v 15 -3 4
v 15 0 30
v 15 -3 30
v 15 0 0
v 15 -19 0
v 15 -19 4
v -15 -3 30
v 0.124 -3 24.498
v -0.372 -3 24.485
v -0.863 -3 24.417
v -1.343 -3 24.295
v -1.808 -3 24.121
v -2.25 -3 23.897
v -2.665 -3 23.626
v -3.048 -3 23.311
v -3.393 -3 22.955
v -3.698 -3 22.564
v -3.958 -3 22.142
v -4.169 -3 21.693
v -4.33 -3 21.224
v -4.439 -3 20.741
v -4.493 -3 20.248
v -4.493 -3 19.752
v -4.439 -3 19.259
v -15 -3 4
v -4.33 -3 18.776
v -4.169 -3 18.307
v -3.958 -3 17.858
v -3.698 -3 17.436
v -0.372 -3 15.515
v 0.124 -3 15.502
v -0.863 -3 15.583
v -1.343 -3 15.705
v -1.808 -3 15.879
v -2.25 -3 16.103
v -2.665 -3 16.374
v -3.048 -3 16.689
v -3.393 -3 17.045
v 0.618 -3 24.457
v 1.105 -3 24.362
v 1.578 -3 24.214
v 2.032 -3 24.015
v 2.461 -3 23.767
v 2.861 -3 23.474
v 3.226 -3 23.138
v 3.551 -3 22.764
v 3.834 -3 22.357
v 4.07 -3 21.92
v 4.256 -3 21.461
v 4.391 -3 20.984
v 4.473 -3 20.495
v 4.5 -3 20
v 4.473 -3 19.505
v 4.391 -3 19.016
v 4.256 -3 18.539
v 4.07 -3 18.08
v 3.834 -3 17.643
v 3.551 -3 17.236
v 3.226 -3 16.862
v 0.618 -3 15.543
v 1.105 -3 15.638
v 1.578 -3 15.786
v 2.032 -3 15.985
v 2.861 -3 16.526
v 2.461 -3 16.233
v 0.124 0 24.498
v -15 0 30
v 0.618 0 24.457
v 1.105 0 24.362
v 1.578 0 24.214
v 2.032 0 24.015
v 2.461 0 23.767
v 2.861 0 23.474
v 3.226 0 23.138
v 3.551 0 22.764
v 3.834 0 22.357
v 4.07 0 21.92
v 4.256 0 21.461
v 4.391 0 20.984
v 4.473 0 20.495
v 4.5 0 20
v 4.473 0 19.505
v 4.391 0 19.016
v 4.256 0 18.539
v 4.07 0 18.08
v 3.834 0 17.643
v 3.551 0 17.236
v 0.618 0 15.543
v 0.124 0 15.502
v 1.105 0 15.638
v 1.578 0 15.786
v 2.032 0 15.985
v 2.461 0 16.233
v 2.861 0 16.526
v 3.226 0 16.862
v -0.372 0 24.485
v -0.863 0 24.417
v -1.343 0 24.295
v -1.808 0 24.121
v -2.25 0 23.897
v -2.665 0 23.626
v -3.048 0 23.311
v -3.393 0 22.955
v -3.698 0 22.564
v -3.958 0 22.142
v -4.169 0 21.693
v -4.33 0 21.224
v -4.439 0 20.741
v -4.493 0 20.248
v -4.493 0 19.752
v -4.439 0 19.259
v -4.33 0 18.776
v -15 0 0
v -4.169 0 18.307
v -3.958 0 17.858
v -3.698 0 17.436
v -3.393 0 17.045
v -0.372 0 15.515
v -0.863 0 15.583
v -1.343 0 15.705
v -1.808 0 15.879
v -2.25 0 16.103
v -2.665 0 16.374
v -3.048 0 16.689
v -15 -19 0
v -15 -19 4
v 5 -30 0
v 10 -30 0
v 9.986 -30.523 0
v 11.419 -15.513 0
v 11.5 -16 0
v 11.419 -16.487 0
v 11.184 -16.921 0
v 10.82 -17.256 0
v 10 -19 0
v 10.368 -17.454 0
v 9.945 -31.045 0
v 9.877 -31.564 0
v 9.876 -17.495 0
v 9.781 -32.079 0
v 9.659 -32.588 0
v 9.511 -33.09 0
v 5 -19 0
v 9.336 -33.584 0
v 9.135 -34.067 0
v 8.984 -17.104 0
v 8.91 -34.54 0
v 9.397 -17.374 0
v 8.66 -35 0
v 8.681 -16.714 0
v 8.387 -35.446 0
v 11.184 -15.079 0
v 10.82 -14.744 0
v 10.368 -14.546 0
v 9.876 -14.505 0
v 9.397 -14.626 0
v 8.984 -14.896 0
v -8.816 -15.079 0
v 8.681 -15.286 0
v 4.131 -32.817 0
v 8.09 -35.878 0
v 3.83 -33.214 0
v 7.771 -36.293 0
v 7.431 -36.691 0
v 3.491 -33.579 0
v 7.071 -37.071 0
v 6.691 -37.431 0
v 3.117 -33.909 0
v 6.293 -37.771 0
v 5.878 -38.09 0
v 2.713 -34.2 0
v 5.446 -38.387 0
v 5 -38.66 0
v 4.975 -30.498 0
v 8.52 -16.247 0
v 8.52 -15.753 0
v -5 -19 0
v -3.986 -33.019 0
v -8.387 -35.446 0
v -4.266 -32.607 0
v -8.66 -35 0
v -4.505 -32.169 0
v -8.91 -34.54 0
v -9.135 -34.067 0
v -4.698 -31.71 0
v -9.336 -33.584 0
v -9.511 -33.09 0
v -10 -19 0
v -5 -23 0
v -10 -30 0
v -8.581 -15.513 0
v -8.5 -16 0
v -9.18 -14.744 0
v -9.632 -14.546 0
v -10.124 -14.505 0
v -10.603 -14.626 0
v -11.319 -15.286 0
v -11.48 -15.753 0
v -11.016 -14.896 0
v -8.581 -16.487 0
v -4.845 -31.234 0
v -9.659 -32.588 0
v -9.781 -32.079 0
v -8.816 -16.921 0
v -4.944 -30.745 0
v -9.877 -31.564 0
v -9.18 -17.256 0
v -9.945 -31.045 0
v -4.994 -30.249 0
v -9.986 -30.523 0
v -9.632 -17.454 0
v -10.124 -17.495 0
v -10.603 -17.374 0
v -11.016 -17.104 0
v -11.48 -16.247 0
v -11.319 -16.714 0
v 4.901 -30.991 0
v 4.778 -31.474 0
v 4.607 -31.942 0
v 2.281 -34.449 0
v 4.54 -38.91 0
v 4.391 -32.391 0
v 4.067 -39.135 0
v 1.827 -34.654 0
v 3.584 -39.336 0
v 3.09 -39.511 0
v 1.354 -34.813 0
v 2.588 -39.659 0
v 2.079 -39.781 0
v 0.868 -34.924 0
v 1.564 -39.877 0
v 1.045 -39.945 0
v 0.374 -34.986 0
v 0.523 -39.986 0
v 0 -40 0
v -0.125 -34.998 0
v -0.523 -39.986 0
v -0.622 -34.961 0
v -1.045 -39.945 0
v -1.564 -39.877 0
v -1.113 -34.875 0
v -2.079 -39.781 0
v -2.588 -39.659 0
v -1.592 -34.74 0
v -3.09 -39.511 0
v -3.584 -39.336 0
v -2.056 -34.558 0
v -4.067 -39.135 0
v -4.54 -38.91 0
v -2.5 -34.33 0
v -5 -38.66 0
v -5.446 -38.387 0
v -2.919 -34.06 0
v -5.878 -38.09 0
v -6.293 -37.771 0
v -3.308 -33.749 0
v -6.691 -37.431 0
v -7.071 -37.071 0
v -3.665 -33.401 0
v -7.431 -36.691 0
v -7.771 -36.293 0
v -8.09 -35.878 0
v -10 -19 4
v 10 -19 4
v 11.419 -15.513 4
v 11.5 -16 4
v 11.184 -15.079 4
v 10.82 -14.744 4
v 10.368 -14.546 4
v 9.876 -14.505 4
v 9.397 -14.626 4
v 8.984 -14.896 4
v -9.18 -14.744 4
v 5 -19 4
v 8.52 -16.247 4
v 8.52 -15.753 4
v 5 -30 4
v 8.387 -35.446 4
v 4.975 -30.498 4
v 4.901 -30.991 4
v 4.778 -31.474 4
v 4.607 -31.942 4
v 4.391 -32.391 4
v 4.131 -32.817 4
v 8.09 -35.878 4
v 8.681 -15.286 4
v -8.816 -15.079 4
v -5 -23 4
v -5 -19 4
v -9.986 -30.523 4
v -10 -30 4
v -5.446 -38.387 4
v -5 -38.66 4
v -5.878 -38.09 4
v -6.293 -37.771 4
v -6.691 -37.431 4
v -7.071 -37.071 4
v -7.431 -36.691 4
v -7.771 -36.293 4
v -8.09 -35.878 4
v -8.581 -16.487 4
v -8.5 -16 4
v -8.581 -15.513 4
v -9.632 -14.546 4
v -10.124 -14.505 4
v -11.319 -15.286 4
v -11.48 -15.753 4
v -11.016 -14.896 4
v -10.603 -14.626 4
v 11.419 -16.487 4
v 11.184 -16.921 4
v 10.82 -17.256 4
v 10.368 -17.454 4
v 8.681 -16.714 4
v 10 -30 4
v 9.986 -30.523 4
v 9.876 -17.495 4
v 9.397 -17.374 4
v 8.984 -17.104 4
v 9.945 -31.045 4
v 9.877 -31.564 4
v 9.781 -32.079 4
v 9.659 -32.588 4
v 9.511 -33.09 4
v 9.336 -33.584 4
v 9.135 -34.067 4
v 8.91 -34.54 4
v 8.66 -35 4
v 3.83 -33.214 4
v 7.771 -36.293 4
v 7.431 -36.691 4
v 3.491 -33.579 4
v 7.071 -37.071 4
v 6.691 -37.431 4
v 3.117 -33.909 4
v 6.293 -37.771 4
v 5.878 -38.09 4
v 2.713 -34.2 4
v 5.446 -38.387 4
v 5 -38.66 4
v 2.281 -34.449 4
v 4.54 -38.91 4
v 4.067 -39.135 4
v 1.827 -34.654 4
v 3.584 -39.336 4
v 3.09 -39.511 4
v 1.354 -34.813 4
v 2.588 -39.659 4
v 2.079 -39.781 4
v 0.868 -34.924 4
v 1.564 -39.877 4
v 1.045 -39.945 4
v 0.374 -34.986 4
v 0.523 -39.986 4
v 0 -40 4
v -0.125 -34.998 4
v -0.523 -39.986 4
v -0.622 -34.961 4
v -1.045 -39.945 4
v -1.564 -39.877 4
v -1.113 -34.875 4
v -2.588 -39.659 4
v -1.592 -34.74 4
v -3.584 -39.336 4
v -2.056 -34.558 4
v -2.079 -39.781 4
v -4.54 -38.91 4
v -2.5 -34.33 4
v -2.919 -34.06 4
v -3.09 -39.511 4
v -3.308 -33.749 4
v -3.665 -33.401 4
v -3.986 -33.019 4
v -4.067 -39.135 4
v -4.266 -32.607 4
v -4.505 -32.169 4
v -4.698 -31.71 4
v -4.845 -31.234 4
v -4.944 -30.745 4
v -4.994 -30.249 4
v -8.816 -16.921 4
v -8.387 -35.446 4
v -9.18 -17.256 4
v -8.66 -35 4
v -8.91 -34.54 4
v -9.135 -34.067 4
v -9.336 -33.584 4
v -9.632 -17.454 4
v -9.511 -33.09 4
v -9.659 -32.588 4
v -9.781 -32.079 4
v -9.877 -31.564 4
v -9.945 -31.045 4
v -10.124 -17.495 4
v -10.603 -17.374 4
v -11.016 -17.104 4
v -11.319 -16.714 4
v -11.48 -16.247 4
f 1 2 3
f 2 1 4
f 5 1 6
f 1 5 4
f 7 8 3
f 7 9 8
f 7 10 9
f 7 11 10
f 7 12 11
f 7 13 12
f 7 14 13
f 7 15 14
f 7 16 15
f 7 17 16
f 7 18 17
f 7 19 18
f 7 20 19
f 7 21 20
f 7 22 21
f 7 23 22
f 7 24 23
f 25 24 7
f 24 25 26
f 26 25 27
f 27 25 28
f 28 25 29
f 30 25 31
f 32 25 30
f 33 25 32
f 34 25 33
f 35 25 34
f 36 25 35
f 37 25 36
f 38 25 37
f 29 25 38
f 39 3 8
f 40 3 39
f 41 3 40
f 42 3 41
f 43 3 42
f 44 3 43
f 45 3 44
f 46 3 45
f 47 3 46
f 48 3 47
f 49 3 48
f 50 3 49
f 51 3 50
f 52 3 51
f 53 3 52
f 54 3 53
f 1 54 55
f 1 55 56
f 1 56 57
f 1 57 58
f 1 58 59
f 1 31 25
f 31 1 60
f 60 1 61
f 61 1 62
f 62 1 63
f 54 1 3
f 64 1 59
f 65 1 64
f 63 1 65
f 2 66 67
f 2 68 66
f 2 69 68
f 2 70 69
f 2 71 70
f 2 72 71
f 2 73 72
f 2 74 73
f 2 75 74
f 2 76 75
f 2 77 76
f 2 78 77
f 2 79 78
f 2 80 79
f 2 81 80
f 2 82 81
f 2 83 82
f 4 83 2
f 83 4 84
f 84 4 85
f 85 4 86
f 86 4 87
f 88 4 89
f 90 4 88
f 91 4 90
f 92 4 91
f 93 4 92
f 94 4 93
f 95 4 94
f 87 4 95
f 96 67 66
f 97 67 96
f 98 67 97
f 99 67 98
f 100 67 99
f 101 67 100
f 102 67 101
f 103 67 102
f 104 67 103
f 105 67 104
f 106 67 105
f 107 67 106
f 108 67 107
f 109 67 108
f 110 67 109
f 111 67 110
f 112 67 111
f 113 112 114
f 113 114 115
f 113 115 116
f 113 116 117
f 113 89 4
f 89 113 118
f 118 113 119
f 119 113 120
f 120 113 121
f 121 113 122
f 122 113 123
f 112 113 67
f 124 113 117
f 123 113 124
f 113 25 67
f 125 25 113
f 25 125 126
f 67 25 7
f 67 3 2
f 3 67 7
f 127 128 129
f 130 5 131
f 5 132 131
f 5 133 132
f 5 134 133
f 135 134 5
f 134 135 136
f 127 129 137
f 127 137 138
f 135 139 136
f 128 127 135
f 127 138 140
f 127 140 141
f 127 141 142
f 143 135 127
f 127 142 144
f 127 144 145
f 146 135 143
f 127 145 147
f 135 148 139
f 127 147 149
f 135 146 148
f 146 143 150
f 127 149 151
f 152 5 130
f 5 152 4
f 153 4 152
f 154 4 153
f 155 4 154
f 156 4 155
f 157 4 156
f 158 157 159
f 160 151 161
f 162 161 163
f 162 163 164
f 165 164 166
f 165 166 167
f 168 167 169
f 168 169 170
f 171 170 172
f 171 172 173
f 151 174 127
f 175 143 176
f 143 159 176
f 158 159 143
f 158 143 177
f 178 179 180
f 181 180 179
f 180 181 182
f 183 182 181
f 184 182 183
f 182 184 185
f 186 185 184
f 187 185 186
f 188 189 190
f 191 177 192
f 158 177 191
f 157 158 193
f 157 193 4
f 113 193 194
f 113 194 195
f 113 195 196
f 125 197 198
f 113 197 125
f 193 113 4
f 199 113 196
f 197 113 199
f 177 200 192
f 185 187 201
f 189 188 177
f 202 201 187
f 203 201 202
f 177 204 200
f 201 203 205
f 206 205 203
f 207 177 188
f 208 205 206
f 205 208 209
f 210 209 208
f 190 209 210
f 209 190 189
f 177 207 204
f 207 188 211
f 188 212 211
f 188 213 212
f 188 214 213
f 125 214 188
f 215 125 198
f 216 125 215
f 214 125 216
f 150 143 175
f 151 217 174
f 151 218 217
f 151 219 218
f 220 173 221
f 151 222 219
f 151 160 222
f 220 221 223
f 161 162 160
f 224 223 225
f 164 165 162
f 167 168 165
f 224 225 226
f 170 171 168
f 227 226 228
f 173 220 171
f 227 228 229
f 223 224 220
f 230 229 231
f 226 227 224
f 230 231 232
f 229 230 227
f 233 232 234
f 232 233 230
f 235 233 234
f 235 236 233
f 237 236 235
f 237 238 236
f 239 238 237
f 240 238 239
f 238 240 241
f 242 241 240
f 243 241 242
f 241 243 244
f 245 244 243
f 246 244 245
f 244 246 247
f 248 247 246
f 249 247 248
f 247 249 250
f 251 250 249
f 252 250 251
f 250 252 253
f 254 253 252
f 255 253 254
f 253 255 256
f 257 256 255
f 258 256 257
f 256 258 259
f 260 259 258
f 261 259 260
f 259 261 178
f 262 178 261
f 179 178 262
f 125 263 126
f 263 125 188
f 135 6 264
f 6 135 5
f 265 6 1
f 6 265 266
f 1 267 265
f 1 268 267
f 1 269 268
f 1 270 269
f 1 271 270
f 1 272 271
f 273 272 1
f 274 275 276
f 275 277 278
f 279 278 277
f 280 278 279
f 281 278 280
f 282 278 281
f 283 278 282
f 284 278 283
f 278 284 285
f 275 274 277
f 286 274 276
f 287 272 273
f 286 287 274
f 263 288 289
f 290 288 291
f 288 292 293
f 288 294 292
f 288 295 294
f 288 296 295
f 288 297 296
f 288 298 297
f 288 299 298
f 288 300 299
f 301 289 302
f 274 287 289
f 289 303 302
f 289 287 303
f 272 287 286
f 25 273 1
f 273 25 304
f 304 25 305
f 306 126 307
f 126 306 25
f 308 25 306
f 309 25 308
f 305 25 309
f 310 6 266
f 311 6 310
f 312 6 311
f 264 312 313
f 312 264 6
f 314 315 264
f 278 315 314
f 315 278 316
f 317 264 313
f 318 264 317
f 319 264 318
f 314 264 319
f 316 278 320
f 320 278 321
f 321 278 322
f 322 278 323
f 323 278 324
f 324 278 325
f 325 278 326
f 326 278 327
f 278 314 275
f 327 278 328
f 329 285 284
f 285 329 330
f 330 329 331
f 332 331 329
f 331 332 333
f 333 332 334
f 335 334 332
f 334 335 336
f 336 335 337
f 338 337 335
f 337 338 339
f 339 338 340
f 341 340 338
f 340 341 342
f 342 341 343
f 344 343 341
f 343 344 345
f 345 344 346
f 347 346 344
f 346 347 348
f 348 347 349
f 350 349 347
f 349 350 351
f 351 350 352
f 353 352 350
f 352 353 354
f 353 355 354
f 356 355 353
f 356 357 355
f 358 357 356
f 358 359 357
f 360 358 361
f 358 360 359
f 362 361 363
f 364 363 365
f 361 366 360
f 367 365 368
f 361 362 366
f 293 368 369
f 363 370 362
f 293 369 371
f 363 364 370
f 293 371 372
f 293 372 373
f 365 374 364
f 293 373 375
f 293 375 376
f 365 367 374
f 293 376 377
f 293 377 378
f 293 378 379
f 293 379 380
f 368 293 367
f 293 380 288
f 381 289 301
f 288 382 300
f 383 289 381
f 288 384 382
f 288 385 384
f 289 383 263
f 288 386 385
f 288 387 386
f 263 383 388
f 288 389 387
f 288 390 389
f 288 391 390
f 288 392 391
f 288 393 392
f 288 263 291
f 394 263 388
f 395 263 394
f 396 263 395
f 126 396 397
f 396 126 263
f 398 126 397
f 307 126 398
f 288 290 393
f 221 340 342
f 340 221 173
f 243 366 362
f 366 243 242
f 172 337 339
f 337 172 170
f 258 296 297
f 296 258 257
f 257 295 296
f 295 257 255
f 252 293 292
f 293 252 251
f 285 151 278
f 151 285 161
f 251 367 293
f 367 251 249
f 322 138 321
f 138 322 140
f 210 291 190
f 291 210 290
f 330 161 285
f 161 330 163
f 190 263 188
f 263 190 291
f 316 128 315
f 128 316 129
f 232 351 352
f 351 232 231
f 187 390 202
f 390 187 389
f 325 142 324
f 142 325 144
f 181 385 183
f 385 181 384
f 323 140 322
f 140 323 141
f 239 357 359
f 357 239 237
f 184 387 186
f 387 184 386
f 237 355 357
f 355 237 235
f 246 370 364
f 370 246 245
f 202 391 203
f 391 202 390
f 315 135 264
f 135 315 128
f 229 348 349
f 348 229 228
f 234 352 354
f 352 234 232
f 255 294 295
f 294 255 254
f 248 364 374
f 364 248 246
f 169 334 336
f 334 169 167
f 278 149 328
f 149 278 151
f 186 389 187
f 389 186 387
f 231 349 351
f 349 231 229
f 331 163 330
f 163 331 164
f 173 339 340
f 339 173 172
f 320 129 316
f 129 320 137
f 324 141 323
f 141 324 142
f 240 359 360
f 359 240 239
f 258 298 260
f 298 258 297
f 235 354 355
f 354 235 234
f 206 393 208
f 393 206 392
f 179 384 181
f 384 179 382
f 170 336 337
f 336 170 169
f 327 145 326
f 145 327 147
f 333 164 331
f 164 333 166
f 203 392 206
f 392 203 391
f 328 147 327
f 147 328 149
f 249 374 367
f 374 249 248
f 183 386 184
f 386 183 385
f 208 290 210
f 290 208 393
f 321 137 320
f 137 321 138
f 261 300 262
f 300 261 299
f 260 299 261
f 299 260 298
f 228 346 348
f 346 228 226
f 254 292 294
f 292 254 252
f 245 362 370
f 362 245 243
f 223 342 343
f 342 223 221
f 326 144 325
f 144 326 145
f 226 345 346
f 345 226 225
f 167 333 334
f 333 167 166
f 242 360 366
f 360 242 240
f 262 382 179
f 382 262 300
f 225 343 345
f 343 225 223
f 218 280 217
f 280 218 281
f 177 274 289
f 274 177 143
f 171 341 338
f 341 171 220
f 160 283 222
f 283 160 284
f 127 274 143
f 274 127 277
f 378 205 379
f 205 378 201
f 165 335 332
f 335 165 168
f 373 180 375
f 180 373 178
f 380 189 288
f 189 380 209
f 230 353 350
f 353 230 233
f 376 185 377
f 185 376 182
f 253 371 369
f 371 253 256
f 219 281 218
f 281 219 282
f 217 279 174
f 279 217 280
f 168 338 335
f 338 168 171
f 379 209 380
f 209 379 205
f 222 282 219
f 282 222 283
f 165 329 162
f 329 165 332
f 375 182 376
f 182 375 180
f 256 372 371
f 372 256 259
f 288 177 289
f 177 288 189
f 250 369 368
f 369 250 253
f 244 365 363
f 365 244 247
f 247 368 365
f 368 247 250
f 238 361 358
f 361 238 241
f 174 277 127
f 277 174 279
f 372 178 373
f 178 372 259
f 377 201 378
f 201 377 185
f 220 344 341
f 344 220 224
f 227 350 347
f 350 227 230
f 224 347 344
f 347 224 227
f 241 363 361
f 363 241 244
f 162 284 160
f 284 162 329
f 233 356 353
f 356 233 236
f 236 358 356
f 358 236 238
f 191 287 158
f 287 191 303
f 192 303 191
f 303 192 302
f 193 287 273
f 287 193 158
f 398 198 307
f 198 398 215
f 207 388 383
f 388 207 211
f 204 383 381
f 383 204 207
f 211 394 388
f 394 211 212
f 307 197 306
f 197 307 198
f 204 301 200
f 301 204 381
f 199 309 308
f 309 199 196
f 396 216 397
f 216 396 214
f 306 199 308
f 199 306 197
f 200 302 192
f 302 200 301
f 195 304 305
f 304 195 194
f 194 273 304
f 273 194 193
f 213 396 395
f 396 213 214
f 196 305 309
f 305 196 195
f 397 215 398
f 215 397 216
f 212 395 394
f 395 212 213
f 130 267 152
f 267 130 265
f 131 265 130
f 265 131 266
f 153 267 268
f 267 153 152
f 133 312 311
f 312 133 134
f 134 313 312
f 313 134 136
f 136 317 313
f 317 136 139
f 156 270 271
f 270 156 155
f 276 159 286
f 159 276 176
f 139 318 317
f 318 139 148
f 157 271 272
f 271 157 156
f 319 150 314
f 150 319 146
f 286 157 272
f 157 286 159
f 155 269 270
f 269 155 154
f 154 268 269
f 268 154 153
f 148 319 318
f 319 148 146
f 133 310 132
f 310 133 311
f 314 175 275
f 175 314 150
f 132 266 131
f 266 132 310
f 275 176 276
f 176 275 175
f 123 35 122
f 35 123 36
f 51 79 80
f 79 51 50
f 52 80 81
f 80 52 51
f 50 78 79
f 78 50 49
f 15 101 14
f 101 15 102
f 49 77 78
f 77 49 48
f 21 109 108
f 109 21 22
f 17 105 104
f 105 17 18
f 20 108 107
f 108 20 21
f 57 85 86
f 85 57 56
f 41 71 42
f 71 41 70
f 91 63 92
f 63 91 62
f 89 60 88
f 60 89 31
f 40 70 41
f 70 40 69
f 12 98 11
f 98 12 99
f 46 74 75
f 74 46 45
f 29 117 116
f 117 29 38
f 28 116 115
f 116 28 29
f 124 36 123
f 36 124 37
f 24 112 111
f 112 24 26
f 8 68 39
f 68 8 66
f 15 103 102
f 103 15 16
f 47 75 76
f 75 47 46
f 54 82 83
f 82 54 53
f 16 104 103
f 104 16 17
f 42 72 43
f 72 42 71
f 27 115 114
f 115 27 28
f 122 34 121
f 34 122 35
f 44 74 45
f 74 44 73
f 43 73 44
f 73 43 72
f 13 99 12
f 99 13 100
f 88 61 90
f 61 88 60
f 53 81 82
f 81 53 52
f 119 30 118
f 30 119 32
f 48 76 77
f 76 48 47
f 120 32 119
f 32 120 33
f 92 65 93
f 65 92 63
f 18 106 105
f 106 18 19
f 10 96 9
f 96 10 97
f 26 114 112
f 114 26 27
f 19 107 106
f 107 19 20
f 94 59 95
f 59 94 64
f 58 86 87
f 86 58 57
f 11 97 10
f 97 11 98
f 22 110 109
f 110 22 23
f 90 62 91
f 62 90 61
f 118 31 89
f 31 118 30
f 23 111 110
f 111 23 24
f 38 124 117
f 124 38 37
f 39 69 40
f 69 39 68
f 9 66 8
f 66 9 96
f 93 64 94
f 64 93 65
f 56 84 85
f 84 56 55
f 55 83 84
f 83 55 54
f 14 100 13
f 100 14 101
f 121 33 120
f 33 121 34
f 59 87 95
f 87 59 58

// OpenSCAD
$fs=$fs/4;
$fa=$fa/4;

e=4;
h=30;

rotate([90,0,0])difference(){
    union(){
        translate([-15,  0, 0])cube([30,30,3]);
       
        translate([-15,  0, 0])cube([30,e,15+e]);
        hull(){
            translate([-10,  0, 0])cube([20,e,e]);
            translate([0,  0, h]) rotate([-90,0,0])cylinder(r=10, e);
        }
    }
    
    hull(){
        translate([-5,  0, 15+e])cube([10,e,e]);
        translate([0,  -1, h]) rotate([-90,0,0])cylinder(r=5, e+2);
    }
    translate([-10,  -1, e+12]) rotate([-90,0,0])cylinder(r=1.5, e+2);
    translate([ 10,  -1, e+12]) rotate([-90,0,0])cylinder(r=1.5, e+2);
    
    translate([ 0,  20, -1])cylinder(r=4.5, e+2);
}
